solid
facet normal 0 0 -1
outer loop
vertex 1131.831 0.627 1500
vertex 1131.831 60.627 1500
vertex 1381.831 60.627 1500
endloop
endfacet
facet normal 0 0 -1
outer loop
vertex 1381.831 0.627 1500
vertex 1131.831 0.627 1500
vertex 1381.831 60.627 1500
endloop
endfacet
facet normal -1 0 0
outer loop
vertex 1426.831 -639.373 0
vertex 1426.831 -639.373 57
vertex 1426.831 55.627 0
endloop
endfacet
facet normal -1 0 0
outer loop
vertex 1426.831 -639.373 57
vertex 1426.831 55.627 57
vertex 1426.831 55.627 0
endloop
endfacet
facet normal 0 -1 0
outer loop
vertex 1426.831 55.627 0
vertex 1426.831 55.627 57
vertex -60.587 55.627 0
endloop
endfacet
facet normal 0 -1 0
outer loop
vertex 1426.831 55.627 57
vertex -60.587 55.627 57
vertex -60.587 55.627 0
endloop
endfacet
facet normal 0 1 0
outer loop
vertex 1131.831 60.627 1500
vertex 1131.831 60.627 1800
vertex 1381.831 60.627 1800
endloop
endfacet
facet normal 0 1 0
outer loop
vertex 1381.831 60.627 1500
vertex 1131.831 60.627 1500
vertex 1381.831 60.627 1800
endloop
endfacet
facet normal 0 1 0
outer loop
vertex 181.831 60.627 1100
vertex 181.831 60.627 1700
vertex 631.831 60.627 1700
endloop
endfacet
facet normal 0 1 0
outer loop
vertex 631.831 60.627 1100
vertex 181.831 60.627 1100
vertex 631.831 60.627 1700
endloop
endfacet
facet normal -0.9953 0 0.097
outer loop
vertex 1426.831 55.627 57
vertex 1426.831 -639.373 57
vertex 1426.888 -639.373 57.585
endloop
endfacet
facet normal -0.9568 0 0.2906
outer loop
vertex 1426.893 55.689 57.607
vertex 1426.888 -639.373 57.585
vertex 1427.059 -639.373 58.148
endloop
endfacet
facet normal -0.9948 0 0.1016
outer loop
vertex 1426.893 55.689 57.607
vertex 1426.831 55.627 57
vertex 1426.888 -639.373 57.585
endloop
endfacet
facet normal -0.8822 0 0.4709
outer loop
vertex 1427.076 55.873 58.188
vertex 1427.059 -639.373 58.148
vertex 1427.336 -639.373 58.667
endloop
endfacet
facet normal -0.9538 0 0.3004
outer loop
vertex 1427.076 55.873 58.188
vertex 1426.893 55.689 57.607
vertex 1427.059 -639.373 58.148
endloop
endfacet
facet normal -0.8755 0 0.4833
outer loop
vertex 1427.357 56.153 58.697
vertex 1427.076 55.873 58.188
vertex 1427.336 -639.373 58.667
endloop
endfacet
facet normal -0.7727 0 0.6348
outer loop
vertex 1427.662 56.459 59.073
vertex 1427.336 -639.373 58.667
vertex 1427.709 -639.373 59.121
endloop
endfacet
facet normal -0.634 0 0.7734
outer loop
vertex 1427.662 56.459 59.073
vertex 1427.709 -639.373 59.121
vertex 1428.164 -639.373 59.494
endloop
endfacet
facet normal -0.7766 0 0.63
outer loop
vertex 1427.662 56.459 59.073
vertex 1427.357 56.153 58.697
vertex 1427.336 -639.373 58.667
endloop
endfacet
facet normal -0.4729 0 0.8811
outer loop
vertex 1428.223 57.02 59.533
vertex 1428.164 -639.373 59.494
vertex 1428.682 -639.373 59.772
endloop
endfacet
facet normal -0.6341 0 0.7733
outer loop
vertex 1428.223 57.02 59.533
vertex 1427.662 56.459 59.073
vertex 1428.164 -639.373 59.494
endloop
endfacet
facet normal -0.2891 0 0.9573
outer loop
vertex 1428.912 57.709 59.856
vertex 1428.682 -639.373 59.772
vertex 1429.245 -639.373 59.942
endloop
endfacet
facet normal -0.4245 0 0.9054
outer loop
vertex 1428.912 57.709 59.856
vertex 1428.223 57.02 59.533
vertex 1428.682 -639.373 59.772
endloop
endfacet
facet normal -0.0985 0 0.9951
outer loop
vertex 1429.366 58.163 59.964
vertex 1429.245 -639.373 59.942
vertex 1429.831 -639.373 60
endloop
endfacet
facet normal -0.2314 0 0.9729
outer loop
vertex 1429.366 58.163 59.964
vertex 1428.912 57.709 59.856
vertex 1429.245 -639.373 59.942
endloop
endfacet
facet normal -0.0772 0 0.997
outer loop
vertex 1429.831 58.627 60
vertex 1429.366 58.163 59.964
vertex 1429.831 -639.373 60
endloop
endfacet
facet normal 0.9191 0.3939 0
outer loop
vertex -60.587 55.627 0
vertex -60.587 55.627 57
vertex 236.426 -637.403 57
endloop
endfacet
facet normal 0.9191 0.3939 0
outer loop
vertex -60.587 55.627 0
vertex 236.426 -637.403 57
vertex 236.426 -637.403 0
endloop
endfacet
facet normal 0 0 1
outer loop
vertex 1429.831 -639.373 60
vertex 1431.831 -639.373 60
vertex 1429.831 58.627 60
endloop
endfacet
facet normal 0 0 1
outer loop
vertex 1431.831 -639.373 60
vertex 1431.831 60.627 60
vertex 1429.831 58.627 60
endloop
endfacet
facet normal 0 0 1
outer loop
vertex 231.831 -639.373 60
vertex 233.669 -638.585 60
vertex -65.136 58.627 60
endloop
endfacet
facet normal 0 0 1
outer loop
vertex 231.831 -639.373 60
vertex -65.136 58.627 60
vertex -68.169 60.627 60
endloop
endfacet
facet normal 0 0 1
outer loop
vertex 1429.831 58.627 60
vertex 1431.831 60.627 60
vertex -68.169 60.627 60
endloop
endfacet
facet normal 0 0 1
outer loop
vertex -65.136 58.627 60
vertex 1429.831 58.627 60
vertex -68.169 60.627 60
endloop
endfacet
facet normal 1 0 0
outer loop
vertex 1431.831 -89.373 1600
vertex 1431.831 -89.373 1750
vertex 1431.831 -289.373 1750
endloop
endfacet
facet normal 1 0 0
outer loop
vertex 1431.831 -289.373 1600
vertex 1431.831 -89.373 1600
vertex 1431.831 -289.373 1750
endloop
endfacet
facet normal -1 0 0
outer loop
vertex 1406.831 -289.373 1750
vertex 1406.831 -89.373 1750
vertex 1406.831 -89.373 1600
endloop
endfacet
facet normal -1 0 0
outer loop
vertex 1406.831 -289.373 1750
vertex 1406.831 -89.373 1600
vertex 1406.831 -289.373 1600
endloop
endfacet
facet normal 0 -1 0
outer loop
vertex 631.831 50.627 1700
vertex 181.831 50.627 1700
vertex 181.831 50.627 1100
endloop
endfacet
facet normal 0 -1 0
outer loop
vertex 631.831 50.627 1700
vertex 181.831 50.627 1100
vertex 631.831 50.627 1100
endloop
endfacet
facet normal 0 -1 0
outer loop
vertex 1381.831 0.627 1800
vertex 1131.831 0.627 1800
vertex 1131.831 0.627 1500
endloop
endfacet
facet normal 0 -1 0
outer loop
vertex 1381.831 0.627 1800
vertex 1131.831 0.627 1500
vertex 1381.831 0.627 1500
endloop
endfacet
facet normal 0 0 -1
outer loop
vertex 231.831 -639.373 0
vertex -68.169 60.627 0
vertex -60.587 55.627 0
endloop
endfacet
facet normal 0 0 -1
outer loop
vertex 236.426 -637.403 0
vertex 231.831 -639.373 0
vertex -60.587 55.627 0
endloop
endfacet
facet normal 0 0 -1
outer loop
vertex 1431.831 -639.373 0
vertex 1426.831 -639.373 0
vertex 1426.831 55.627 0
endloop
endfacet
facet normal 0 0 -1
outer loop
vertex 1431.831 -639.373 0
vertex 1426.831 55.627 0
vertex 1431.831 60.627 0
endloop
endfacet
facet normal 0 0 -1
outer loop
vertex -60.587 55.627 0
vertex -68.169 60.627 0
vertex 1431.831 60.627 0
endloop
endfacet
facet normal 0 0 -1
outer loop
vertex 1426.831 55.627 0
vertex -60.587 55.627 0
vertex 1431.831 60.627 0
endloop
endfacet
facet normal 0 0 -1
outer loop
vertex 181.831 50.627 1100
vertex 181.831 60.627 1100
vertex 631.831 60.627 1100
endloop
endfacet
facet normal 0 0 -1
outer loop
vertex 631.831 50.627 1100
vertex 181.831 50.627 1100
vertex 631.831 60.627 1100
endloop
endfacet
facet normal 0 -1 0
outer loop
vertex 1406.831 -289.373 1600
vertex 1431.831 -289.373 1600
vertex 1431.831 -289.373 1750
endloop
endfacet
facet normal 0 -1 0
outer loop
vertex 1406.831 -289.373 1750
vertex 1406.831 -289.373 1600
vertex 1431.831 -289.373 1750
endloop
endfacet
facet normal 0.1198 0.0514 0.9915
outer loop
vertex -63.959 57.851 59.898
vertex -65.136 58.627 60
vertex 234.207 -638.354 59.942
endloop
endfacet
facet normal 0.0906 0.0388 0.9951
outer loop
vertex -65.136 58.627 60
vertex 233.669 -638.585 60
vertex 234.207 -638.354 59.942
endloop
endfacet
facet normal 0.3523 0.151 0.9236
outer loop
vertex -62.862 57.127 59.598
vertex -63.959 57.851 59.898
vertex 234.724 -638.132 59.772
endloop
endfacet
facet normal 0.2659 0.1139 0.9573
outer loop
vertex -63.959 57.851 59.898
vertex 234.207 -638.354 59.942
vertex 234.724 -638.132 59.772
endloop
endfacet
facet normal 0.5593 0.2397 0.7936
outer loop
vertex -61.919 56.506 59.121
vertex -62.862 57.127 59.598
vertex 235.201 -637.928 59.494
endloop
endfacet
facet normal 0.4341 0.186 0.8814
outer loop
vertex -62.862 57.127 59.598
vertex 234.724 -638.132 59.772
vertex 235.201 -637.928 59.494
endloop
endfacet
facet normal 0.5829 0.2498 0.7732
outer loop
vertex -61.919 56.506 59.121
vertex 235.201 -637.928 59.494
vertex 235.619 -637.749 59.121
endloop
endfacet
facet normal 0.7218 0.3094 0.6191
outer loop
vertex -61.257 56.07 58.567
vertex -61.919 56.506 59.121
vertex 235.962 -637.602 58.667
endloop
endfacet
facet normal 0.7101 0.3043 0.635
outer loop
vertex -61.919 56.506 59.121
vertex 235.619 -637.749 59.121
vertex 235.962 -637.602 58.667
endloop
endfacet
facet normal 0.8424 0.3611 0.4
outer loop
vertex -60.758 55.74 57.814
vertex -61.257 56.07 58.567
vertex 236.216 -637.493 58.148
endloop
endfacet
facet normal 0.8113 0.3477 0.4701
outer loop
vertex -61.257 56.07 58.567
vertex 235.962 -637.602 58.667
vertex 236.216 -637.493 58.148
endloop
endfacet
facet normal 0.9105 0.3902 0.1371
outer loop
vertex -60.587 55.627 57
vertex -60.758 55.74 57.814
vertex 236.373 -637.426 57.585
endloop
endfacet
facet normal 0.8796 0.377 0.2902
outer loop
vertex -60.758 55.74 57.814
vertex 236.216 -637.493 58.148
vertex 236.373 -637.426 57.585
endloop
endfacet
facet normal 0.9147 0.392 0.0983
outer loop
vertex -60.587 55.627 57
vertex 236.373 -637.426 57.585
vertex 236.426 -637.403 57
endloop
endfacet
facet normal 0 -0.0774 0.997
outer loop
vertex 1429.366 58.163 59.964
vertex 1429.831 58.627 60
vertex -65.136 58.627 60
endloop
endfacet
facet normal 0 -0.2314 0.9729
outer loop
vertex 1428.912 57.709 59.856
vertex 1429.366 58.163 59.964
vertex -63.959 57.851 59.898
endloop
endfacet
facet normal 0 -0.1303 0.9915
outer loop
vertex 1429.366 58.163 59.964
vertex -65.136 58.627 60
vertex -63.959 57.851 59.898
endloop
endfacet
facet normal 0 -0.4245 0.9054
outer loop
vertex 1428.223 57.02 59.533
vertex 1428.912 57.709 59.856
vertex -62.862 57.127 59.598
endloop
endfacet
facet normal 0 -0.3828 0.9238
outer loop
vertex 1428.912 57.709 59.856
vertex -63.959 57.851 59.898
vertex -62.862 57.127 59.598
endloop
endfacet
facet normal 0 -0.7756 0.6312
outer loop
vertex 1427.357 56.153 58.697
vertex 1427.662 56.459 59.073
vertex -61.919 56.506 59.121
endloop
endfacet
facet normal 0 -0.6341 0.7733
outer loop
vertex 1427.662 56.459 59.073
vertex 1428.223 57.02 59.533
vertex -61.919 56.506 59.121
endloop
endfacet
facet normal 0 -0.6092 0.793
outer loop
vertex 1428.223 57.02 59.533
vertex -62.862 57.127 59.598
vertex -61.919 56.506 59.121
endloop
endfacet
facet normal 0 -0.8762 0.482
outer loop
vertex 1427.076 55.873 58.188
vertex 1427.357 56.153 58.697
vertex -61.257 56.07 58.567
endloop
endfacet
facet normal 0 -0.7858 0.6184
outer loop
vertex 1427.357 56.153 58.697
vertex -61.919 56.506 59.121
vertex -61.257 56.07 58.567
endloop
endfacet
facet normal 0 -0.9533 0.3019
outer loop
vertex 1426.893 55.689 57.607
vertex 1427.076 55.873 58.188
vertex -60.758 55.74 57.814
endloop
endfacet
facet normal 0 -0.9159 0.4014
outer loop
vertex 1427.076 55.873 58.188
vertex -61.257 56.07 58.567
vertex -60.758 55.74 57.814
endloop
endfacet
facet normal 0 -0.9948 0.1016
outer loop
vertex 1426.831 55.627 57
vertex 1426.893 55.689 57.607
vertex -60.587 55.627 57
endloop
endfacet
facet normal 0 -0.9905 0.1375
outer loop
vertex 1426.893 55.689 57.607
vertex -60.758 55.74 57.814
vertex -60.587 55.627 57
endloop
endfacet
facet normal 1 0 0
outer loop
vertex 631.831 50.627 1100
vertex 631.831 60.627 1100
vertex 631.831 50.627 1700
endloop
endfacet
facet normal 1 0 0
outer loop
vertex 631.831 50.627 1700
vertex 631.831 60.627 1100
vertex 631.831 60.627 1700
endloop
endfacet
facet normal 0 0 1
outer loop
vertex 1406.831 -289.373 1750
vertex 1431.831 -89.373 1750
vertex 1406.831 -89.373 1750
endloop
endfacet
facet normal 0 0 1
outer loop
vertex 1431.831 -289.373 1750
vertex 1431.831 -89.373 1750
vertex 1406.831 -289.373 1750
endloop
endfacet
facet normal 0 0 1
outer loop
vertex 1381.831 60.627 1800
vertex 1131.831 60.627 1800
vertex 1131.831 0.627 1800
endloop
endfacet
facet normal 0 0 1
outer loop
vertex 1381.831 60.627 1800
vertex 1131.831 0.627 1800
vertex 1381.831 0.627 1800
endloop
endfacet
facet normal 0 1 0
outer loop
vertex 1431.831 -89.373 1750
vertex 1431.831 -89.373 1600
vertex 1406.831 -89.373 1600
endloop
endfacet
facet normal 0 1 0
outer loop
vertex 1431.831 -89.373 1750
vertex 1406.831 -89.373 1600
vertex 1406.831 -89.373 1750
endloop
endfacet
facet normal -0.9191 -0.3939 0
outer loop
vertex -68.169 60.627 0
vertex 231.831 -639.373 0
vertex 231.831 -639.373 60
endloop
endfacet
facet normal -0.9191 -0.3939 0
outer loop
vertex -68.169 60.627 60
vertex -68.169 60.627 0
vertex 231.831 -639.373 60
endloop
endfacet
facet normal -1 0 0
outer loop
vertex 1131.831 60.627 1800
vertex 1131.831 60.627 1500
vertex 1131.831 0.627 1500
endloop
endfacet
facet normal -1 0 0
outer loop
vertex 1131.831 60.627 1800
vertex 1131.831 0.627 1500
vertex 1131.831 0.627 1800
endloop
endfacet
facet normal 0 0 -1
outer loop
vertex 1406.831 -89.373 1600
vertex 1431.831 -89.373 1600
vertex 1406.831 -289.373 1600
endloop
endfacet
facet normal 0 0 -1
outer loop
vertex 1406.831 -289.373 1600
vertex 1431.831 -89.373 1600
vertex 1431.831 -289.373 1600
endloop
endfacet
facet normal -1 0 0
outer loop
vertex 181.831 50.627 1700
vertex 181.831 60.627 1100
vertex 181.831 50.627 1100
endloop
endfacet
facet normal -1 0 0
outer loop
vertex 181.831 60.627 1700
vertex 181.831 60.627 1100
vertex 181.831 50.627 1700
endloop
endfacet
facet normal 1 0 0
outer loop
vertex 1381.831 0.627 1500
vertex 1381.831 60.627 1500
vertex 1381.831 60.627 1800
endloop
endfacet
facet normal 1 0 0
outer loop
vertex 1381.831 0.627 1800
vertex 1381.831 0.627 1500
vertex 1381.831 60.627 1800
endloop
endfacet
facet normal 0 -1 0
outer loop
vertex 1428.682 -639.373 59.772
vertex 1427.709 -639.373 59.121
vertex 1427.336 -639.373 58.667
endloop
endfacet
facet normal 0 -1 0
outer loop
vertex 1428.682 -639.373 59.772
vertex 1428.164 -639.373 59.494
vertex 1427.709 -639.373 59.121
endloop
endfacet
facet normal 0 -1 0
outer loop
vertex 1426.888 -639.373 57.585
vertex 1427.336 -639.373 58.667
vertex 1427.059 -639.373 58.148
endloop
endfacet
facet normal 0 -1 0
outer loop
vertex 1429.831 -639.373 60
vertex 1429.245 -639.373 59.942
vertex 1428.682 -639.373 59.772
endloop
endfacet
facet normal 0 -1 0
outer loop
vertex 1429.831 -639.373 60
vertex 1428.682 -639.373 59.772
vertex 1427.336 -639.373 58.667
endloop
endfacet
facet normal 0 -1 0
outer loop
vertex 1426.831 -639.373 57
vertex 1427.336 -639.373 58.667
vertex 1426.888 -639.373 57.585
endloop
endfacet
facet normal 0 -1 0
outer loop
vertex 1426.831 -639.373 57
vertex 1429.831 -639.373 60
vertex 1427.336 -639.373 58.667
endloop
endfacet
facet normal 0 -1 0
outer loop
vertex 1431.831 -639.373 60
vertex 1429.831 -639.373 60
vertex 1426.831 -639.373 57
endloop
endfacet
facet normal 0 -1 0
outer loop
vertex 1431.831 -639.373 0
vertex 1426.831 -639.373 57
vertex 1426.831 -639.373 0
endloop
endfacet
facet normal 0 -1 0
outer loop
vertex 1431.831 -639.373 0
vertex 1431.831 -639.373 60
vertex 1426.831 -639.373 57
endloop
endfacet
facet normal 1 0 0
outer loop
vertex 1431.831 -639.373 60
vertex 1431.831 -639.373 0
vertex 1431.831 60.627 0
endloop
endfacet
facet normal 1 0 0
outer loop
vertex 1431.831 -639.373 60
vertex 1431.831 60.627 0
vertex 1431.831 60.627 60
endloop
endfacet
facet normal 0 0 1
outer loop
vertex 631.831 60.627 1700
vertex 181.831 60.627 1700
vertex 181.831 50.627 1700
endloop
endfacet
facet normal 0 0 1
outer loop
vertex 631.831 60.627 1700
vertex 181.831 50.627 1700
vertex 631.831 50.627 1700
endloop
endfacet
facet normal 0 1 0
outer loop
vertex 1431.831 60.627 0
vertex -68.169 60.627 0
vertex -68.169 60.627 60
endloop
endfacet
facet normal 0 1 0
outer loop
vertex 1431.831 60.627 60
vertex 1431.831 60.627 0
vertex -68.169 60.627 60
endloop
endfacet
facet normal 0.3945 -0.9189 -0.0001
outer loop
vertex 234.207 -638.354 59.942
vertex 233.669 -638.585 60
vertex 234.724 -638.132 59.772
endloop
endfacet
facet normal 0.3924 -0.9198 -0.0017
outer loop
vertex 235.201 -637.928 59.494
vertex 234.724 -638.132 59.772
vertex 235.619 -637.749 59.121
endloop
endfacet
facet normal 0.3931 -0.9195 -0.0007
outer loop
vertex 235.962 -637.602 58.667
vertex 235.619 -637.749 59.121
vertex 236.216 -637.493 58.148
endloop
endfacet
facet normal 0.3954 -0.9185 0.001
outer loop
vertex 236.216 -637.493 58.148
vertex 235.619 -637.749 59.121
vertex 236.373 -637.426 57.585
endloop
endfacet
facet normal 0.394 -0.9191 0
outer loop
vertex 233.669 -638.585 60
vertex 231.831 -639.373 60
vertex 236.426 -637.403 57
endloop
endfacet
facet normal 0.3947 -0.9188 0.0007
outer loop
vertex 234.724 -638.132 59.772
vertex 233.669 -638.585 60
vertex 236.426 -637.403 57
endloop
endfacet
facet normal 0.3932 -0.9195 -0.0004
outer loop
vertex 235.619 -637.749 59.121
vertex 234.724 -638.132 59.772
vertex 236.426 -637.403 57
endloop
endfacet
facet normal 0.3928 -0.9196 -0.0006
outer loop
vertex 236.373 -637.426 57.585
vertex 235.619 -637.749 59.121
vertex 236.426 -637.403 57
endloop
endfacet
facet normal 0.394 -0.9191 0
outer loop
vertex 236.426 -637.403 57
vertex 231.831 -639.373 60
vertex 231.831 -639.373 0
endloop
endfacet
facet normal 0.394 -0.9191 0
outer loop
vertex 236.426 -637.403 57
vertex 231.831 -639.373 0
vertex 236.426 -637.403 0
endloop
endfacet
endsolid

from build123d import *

# Parameters (mm, degrees)
F3_W      = 5
F3_H      = 60
F5_R      = 3
F6_W      = 250
F6_H      = 300
F7_DEPTH  = 60
F8_W      = 200
F8_H      = 150
F9_DEPTH  = 25
F10_W     = 450
F10_H     = 600
F11_DEPTH = 10


with BuildPart() as f4:
    # F4: sweep along a path in F0
    with BuildLine(Plane.XY) as f4_path:
        Line((1426.8305338016, -639.3725686498), (1426.8305338016, 55.6274313502))
        Line((1426.8305338016, 55.6274313502), (-60.5867711228, 55.6274313502))
        Line((-60.5867711228, 55.6274313502), (236.4262589517, -637.4029721569))
    # F3 (on line) → F4 (sweep)
    with BuildSketch(Plane.XZ.offset(639.3725686498)):
        with Locations((1429.3305338016, 30)):
            Rectangle(F3_W, F3_H)
    sweep(path=f4_path.line, transition=Transition.RIGHT)

    # F5
    f5_edges = [f4.edges().sort_by_distance(p)[0] for p in [
        (1426.830534, -291.872569, 60),
        (683.121881, 55.627431, 60),
        (87.919744, -290.88777, 60),
    ]]
    fillet(f5_edges, radius=F5_R)


with BuildPart() as f7:
    # F6 (on face) → F7 (new body)
    with BuildSketch(Plane.XZ.offset(-60.6274313502)):
        with Locations((1256.8305338016, 1650)):
            Rectangle(F6_W, F6_H)
    extrude(amount=F7_DEPTH)


with BuildPart() as f9:
    # F8 (on face) → F9 (new body)
    with BuildSketch(Plane(origin=(1431.8305338016, 0, 0), x_dir=(0, -1, 0), z_dir=(-1, 0, 0))):
        with Locations((189.3725686498, 1675)):
            Rectangle(F8_W, F8_H)
    extrude(amount=F9_DEPTH)


with BuildPart() as f11:
    # F10 (on face) → F11 (new body)
    with BuildSketch(Plane.XZ.offset(-60.6274313502)):
        with Locations((406.8305338016, 1400)):
            Rectangle(F10_W, F10_H)
    extrude(amount=F11_DEPTH)


solid = Compound([f4.part, f7.part, f9.part, f11.part])
